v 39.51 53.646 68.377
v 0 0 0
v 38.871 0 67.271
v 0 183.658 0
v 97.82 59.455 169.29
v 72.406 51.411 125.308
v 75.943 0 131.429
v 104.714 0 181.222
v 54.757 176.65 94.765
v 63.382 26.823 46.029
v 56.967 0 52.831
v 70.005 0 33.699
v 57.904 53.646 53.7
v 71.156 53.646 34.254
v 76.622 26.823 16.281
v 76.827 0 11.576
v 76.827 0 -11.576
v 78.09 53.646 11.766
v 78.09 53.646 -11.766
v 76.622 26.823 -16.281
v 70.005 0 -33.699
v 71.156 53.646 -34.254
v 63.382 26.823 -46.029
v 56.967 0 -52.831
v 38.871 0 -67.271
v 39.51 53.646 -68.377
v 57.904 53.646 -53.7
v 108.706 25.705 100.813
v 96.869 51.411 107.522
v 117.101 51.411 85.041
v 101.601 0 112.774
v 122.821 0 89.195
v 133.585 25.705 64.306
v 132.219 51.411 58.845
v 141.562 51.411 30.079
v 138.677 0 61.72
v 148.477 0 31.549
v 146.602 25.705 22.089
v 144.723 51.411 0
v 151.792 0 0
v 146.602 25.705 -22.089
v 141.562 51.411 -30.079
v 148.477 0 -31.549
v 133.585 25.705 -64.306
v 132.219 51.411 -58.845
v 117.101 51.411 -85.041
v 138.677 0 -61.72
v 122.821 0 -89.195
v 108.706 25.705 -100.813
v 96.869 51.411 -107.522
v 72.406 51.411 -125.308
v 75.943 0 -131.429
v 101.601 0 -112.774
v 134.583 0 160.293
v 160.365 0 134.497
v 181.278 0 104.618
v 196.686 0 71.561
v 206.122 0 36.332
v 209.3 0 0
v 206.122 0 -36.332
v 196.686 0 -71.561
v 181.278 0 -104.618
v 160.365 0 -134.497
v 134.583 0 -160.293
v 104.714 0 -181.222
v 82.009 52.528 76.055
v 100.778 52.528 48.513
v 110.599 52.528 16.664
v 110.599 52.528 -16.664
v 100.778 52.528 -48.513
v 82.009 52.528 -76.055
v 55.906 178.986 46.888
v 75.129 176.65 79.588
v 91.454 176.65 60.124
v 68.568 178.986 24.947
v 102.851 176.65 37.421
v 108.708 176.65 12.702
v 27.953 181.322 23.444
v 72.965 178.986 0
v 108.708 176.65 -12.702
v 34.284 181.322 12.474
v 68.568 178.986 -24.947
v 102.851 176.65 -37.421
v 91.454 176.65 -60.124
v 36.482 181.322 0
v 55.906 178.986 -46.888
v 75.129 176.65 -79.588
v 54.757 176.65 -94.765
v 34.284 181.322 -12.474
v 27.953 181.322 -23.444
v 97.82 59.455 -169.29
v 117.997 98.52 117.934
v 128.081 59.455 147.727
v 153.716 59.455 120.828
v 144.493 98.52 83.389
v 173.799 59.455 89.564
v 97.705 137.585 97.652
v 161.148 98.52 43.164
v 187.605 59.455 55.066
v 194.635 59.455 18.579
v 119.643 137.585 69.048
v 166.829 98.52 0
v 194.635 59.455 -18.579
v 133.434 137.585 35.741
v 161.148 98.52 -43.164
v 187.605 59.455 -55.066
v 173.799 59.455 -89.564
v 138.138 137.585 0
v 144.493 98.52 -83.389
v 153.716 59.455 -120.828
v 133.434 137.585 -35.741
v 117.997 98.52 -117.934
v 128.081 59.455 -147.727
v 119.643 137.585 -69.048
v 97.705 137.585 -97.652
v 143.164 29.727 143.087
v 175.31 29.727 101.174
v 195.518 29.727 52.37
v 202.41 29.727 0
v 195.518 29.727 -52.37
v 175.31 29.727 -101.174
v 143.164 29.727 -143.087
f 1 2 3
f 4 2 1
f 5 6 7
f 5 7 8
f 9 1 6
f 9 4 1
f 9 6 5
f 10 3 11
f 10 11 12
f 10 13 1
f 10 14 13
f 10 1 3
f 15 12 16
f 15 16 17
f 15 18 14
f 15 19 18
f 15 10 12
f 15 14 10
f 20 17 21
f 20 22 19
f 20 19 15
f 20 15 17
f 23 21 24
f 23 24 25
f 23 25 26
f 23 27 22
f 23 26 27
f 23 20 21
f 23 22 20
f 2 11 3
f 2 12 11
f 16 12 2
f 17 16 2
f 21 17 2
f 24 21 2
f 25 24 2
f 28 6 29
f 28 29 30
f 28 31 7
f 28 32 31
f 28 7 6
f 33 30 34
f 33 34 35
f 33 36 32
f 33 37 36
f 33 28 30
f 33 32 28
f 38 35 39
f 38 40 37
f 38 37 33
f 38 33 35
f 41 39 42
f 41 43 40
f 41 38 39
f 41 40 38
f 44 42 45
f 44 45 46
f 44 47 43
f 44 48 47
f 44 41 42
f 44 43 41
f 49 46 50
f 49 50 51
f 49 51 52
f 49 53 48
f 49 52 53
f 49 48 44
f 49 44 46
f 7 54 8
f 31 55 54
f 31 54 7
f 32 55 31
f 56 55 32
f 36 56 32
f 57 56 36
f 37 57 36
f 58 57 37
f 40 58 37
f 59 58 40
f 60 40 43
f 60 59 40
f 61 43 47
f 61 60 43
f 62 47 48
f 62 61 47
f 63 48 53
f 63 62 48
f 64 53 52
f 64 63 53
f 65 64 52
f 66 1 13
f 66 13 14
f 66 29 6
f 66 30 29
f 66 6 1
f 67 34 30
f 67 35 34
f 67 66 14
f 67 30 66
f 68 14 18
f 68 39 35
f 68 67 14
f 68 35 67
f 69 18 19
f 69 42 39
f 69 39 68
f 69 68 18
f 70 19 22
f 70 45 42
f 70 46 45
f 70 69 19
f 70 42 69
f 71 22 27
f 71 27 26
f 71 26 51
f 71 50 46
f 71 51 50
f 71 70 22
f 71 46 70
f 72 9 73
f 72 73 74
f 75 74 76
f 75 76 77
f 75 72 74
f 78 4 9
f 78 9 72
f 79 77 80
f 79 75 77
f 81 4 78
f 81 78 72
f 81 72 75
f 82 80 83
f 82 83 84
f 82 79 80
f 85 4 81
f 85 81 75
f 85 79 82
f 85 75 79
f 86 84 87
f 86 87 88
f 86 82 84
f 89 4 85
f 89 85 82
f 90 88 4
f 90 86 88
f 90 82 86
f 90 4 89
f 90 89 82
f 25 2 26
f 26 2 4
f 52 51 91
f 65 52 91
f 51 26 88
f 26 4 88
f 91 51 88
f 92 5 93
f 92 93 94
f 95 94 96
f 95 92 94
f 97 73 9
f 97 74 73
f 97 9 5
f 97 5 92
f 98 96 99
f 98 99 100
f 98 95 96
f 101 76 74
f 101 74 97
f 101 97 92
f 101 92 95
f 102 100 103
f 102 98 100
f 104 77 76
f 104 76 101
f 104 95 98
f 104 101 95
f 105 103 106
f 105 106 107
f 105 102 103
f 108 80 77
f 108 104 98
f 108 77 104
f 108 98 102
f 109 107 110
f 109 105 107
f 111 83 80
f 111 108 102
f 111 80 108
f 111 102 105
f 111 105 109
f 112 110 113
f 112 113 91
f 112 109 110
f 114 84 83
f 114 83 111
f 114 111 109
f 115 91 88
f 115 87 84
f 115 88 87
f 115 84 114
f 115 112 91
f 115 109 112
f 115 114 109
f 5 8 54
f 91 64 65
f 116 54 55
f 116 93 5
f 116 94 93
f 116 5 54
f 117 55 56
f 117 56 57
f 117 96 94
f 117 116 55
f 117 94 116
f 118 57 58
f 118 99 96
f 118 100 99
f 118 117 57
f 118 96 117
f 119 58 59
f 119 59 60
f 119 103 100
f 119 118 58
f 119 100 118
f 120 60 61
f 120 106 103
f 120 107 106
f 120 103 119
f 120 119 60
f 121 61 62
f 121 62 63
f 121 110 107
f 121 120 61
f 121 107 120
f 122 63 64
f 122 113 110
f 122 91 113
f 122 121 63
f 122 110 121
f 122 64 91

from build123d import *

# Parameters (mm, degrees)
F1_ANGLE_BACK = 59.9796203852
F1_ANGLE      = 119.9592407703


with BuildPart() as f1:
    # F0 (on Top) → F1 (revolve)
    with BuildSketch(Plane.XY, mode=Mode.PRIVATE) as f1_sk:
        Polygon((0, 183.6575716734), (0, 0), (77.6938870549, 0), (78.9715871215, 53.645722568), (144.7227597237, 51.4108687639), (151.7917811871, 0), (209.2998325825, 0), (195.5198347569, 59.4546198845), (109.4474121928, 176.6495704651), align=None)
    revolve(f1_sk.sketch.rotate(Axis((0, 91.8287858367, 0), (0, 1, 0)), -F1_ANGLE_BACK), axis=Axis((0, 91.8287858367, 0), (0, 1, 0)), revolution_arc=F1_ANGLE)


solid = f1.part
